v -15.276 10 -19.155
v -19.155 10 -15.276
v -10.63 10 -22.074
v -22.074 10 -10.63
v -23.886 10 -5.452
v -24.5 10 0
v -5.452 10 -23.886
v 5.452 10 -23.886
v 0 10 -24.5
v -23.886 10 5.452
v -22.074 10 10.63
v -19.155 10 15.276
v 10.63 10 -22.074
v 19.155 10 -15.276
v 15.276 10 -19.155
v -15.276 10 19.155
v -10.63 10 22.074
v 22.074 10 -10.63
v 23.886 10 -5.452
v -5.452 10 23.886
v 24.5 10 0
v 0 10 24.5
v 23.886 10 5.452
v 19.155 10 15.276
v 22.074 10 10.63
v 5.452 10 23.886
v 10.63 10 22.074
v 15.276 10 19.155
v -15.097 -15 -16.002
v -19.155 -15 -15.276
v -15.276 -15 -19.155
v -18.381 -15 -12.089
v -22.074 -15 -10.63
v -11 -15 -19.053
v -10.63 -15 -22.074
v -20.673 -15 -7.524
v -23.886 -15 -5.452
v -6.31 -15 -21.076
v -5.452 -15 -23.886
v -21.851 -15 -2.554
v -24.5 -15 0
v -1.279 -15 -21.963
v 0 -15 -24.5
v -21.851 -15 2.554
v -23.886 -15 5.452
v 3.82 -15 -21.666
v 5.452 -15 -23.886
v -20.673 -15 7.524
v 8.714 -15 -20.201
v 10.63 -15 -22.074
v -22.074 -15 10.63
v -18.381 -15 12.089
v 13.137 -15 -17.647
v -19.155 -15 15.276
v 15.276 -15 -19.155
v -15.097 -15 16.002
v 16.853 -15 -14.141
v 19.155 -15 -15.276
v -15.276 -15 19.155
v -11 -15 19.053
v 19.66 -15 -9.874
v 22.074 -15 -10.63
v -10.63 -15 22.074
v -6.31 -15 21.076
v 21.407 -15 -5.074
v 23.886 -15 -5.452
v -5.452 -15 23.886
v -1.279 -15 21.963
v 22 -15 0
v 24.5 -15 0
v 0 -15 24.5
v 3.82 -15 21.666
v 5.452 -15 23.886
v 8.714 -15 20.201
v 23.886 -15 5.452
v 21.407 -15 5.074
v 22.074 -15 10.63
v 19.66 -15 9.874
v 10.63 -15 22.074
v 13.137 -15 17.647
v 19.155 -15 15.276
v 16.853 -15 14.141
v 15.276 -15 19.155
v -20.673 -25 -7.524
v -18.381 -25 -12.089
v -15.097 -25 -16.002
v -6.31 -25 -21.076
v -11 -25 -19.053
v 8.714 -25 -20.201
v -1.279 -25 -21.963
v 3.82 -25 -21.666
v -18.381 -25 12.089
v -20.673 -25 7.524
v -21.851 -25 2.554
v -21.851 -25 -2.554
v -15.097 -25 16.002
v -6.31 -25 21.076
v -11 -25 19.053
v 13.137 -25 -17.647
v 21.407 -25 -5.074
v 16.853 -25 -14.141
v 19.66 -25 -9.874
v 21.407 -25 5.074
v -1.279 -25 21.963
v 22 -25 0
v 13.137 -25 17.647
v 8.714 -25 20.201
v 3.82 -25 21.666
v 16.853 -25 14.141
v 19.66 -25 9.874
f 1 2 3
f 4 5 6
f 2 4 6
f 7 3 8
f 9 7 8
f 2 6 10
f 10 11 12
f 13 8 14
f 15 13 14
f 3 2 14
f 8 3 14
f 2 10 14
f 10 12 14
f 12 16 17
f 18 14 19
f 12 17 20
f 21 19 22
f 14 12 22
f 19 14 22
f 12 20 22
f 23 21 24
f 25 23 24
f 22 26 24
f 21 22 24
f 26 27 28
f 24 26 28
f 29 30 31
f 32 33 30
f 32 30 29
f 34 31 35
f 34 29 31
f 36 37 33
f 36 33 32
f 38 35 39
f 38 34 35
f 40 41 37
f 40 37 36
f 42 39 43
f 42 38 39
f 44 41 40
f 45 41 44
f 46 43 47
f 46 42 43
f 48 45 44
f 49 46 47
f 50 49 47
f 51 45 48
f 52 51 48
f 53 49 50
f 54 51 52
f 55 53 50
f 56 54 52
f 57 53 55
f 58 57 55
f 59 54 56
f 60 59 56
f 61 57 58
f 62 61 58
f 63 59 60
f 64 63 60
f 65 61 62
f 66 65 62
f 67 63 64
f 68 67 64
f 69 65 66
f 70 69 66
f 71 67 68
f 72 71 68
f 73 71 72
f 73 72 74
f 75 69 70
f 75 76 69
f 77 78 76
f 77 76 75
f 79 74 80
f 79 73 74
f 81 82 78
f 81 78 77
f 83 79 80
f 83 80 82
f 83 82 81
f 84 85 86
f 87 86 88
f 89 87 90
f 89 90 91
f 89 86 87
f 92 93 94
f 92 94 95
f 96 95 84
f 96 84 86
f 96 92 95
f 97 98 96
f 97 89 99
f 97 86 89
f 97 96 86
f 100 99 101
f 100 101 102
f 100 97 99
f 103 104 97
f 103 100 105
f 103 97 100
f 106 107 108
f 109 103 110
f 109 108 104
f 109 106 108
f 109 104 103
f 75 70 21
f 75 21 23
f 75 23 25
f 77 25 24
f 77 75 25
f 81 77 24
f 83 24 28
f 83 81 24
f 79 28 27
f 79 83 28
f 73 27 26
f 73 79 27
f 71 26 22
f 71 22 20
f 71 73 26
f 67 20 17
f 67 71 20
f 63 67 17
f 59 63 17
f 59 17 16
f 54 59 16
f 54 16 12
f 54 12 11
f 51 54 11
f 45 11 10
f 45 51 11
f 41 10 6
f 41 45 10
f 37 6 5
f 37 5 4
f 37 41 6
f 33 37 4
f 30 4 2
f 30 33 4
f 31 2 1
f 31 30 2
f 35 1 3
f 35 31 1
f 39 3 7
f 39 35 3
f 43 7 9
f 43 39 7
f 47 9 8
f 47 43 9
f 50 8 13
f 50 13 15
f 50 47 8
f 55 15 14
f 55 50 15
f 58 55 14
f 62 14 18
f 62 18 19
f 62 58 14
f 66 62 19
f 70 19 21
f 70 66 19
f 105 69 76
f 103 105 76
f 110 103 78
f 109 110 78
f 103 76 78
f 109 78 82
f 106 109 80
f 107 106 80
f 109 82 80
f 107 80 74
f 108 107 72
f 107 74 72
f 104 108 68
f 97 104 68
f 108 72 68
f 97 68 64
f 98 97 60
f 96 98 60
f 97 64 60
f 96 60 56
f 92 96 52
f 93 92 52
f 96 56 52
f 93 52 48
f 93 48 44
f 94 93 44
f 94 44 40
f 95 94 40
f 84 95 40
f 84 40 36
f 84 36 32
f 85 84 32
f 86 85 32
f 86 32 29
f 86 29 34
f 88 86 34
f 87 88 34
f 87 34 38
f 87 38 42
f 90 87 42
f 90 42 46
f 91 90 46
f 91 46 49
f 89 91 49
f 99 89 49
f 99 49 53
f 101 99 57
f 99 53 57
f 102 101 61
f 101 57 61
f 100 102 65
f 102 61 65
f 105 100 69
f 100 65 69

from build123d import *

# Parameters (mm, degrees)
F0_R     = 22
F2_DEPTH = 25
F3_DEPTH = 25
F4_R     = 24.5
F5_DEPTH = 25


with BuildPart() as f2:
    # F0 (on Front) → F2 (new body)
    with BuildSketch(Plane.XZ):
        Circle(F0_R)
        with BuildLine():
            ThreePointArc((-19.401899791, 1.9535312895), (-13.921825835, 13.654038429), (-2.3299484959, 19.3603032003))
            ThreePointArc((-2.3299484959, 19.3603032003), (0, 19.5), (2.3299484959, 19.3603032003))
            ThreePointArc((2.3299484959, 19.3603032003), (13.921825835, 13.654038429), (19.401899791, 1.9535312895))
            ThreePointArc((19.401899791, 1.9535312895), (19.4754595058, 0.9779964404), (19.5, 0))
            ThreePointArc((19.5, 0), (19.4754595058, -0.9779964404), (19.401899791, -1.9535312895))
            ThreePointArc((19.401899791, -1.9535312895), (13.921825835, -13.654038429), (2.3299484959, -19.3603032003))
            ThreePointArc((2.3299484959, -19.3603032003), (0, -19.5), (-2.3299484959, -19.3603032003))
            ThreePointArc((-2.3299484959, -19.3603032003), (-13.921825835, -13.654038429), (-19.401899791, -1.9535312895))
            ThreePointArc((-19.401899791, -1.9535312895), (-19.5, 0), (-19.401899791, 1.9535312895))
        make_face(mode=Mode.SUBTRACT)
    extrude(amount=F2_DEPTH)



with BuildPart() as f2b:
    # F0 (on Front) → F2, piece 2 (new body)
    with BuildSketch(Plane.XZ):
        with BuildLine():
            ThreePointArc((-2.8938206378, 1.9535312895), (-1.7519205381, 1.9616594322), (-1.1833040417, 2.9519508966))
            ThreePointArc((-1.1833040417, 2.9519508966), (-1.5191484267, 3.7627509657), (-2.3299484959, 4.0985953507))
            ThreePointArc((-2.3299484959, 4.0985953507), (-3.4389177943, 3.2434652177), (-2.8938206378, 1.9535312895))
        make_face()
    extrude(amount=F2_DEPTH)


with BuildPart() as f2_1:
    add(f2.part)

    add(f2b.part)  # F3 merges F2b
    # F0 (on Front) → F3 (join)
    with BuildSketch(Plane.XZ):
        with BuildLine():
            ThreePointArc((-2.8938206378, 1.9535312895), (-3.4389177943, 3.2434652177), (-2.3299484959, 4.0985953507))
            Line((-2.3299484959, 4.0985953507), (-2.3299484959, 19.3603032003))
            ThreePointArc((-2.3299484959, 19.3603032003), (-13.921825835, 13.654038429), (-19.401899791, 1.9535312895))
            Line((-19.401899791, 1.9535312895), (-2.8938206378, 1.9535312895))
        make_face()
        with BuildLine():
            ThreePointArc((19.401899791, 1.9535312895), (13.921825835, 13.654038429), (2.3299484959, 19.3603032003))
            Line((2.3299484959, 19.3603032003), (2.3299484959, 4.0985953507))
            ThreePointArc((2.3299484959, 4.0985953507), (3.140748565, 3.7627509657), (3.47659295, 2.9519508966))
            ThreePointArc((3.47659295, 2.9519508966), (3.3202399602, 2.3739229388), (2.8938206378, 1.9535312895))
            Line((2.8938206378, 1.9535312895), (19.401899791, 1.9535312895))
        make_face()
        with BuildLine():
            ThreePointArc((-2.3299484959, 4.0985953507), (-1.5191484267, 3.7627509657), (-1.1833040417, 2.9519508966))
            ThreePointArc((-1.1833040417, 2.9519508966), (-1.7519205381, 1.9616594322), (-2.8938206378, 1.9535312895))
            Line((-2.8938206378, 1.9535312895), (-19.401899791, 1.9535312895))
            ThreePointArc((-19.401899791, 1.9535312895), (-19.5, 0), (-19.401899791, -1.9535312895))
            Line((-19.401899791, -1.9535312895), (-2.8938206378, -1.9535312895))
            ThreePointArc((-2.8938206378, -1.9535312895), (-1.7519205381, -1.9616594322), (-1.1833040417, -2.9519508966))
            ThreePointArc((-1.1833040417, -2.9519508966), (-1.5191484267, -3.7627509657), (-2.3299484959, -4.0985953507))
            Line((-2.3299484959, -4.0985953507), (-2.3299484959, -19.3603032003))
            ThreePointArc((-2.3299484959, -19.3603032003), (0, -19.5), (2.3299484959, -19.3603032003))
            Line((2.3299484959, -19.3603032003), (2.3299484959, -4.0985953507))
            ThreePointArc((2.3299484959, -4.0985953507), (1.2209791974, -2.6604365754), (2.8938206378, -1.9535312895))
            Line((2.8938206378, -1.9535312895), (19.401899791, -1.9535312895))
            ThreePointArc((19.401899791, -1.9535312895), (19.4754595058, -0.9779964404), (19.5, 0))
            ThreePointArc((19.5, 0), (19.4754595058, 0.9779964404), (19.401899791, 1.9535312895))
            Line((19.401899791, 1.9535312895), (2.8938206378, 1.9535312895))
            ThreePointArc((2.8938206378, 1.9535312895), (1.2209791974, 2.6604365754), (2.3299484959, 4.0985953507))
            Line((2.3299484959, 4.0985953507), (2.3299484959, 19.3603032003))
            ThreePointArc((2.3299484959, 19.3603032003), (0, 19.5), (-2.3299484959, 19.3603032003))
            Line((-2.3299484959, 19.3603032003), (-2.3299484959, 4.0985953507))
        make_face()
        with BuildLine():
            Line((-2.8938206378, -1.9535312895), (-19.401899791, -1.9535312895))
            ThreePointArc((-19.401899791, -1.9535312895), (-13.921825835, -13.654038429), (-2.3299484959, -19.3603032003))
            Line((-2.3299484959, -19.3603032003), (-2.3299484959, -4.0985953507))
            ThreePointArc((-2.3299484959, -4.0985953507), (-3.4389177943, -3.2434652177), (-2.8938206378, -1.9535312895))
        make_face()
        with BuildLine():
            Line((2.3299484959, -4.0985953507), (2.3299484959, -19.3603032003))
            ThreePointArc((2.3299484959, -19.3603032003), (13.921825835, -13.654038429), (19.401899791, -1.9535312895))
            Line((19.401899791, -1.9535312895), (2.8938206378, -1.9535312895))
            ThreePointArc((2.8938206378, -1.9535312895), (3.3202399602, -2.3739229388), (3.47659295, -2.9519508966))
            ThreePointArc((3.47659295, -2.9519508966), (3.140748565, -3.7627509657), (2.3299484959, -4.0985953507))
        make_face()
        with BuildLine():
            ThreePointArc((2.8938206378, -1.9535312895), (1.2209791974, -2.6604365754), (2.3299484959, -4.0985953507))
            ThreePointArc((2.3299484959, -4.0985953507), (3.140748565, -3.7627509657), (3.47659295, -2.9519508966))
            ThreePointArc((3.47659295, -2.9519508966), (3.3202399602, -2.3739229388), (2.8938206378, -1.9535312895))
        make_face()
        with BuildLine():
            ThreePointArc((3.47659295, 2.9519508966), (3.140748565, 3.7627509657), (2.3299484959, 4.0985953507))
            ThreePointArc((2.3299484959, 4.0985953507), (1.2209791974, 2.6604365754), (2.8938206378, 1.9535312895))
            ThreePointArc((2.8938206378, 1.9535312895), (3.3202399602, 2.3739229388), (3.47659295, 2.9519508966))
        make_face()
        with BuildLine():
            ThreePointArc((-1.1833040417, -2.9519508966), (-1.7519205381, -1.9616594322), (-2.8938206378, -1.9535312895))
            ThreePointArc((-2.8938206378, -1.9535312895), (-3.4389177943, -3.2434652177), (-2.3299484959, -4.0985953507))
            ThreePointArc((-2.3299484959, -4.0985953507), (-1.5191484267, -3.7627509657), (-1.1833040417, -2.9519508966))
        make_face()
    extrude(amount=F3_DEPTH)

    # F4 (on offset) → F5 (join)
    with BuildSketch(Plane.XZ.offset(15)):
        Circle(F4_R)
    extrude(amount=-F5_DEPTH)


solid = f2_1.part
